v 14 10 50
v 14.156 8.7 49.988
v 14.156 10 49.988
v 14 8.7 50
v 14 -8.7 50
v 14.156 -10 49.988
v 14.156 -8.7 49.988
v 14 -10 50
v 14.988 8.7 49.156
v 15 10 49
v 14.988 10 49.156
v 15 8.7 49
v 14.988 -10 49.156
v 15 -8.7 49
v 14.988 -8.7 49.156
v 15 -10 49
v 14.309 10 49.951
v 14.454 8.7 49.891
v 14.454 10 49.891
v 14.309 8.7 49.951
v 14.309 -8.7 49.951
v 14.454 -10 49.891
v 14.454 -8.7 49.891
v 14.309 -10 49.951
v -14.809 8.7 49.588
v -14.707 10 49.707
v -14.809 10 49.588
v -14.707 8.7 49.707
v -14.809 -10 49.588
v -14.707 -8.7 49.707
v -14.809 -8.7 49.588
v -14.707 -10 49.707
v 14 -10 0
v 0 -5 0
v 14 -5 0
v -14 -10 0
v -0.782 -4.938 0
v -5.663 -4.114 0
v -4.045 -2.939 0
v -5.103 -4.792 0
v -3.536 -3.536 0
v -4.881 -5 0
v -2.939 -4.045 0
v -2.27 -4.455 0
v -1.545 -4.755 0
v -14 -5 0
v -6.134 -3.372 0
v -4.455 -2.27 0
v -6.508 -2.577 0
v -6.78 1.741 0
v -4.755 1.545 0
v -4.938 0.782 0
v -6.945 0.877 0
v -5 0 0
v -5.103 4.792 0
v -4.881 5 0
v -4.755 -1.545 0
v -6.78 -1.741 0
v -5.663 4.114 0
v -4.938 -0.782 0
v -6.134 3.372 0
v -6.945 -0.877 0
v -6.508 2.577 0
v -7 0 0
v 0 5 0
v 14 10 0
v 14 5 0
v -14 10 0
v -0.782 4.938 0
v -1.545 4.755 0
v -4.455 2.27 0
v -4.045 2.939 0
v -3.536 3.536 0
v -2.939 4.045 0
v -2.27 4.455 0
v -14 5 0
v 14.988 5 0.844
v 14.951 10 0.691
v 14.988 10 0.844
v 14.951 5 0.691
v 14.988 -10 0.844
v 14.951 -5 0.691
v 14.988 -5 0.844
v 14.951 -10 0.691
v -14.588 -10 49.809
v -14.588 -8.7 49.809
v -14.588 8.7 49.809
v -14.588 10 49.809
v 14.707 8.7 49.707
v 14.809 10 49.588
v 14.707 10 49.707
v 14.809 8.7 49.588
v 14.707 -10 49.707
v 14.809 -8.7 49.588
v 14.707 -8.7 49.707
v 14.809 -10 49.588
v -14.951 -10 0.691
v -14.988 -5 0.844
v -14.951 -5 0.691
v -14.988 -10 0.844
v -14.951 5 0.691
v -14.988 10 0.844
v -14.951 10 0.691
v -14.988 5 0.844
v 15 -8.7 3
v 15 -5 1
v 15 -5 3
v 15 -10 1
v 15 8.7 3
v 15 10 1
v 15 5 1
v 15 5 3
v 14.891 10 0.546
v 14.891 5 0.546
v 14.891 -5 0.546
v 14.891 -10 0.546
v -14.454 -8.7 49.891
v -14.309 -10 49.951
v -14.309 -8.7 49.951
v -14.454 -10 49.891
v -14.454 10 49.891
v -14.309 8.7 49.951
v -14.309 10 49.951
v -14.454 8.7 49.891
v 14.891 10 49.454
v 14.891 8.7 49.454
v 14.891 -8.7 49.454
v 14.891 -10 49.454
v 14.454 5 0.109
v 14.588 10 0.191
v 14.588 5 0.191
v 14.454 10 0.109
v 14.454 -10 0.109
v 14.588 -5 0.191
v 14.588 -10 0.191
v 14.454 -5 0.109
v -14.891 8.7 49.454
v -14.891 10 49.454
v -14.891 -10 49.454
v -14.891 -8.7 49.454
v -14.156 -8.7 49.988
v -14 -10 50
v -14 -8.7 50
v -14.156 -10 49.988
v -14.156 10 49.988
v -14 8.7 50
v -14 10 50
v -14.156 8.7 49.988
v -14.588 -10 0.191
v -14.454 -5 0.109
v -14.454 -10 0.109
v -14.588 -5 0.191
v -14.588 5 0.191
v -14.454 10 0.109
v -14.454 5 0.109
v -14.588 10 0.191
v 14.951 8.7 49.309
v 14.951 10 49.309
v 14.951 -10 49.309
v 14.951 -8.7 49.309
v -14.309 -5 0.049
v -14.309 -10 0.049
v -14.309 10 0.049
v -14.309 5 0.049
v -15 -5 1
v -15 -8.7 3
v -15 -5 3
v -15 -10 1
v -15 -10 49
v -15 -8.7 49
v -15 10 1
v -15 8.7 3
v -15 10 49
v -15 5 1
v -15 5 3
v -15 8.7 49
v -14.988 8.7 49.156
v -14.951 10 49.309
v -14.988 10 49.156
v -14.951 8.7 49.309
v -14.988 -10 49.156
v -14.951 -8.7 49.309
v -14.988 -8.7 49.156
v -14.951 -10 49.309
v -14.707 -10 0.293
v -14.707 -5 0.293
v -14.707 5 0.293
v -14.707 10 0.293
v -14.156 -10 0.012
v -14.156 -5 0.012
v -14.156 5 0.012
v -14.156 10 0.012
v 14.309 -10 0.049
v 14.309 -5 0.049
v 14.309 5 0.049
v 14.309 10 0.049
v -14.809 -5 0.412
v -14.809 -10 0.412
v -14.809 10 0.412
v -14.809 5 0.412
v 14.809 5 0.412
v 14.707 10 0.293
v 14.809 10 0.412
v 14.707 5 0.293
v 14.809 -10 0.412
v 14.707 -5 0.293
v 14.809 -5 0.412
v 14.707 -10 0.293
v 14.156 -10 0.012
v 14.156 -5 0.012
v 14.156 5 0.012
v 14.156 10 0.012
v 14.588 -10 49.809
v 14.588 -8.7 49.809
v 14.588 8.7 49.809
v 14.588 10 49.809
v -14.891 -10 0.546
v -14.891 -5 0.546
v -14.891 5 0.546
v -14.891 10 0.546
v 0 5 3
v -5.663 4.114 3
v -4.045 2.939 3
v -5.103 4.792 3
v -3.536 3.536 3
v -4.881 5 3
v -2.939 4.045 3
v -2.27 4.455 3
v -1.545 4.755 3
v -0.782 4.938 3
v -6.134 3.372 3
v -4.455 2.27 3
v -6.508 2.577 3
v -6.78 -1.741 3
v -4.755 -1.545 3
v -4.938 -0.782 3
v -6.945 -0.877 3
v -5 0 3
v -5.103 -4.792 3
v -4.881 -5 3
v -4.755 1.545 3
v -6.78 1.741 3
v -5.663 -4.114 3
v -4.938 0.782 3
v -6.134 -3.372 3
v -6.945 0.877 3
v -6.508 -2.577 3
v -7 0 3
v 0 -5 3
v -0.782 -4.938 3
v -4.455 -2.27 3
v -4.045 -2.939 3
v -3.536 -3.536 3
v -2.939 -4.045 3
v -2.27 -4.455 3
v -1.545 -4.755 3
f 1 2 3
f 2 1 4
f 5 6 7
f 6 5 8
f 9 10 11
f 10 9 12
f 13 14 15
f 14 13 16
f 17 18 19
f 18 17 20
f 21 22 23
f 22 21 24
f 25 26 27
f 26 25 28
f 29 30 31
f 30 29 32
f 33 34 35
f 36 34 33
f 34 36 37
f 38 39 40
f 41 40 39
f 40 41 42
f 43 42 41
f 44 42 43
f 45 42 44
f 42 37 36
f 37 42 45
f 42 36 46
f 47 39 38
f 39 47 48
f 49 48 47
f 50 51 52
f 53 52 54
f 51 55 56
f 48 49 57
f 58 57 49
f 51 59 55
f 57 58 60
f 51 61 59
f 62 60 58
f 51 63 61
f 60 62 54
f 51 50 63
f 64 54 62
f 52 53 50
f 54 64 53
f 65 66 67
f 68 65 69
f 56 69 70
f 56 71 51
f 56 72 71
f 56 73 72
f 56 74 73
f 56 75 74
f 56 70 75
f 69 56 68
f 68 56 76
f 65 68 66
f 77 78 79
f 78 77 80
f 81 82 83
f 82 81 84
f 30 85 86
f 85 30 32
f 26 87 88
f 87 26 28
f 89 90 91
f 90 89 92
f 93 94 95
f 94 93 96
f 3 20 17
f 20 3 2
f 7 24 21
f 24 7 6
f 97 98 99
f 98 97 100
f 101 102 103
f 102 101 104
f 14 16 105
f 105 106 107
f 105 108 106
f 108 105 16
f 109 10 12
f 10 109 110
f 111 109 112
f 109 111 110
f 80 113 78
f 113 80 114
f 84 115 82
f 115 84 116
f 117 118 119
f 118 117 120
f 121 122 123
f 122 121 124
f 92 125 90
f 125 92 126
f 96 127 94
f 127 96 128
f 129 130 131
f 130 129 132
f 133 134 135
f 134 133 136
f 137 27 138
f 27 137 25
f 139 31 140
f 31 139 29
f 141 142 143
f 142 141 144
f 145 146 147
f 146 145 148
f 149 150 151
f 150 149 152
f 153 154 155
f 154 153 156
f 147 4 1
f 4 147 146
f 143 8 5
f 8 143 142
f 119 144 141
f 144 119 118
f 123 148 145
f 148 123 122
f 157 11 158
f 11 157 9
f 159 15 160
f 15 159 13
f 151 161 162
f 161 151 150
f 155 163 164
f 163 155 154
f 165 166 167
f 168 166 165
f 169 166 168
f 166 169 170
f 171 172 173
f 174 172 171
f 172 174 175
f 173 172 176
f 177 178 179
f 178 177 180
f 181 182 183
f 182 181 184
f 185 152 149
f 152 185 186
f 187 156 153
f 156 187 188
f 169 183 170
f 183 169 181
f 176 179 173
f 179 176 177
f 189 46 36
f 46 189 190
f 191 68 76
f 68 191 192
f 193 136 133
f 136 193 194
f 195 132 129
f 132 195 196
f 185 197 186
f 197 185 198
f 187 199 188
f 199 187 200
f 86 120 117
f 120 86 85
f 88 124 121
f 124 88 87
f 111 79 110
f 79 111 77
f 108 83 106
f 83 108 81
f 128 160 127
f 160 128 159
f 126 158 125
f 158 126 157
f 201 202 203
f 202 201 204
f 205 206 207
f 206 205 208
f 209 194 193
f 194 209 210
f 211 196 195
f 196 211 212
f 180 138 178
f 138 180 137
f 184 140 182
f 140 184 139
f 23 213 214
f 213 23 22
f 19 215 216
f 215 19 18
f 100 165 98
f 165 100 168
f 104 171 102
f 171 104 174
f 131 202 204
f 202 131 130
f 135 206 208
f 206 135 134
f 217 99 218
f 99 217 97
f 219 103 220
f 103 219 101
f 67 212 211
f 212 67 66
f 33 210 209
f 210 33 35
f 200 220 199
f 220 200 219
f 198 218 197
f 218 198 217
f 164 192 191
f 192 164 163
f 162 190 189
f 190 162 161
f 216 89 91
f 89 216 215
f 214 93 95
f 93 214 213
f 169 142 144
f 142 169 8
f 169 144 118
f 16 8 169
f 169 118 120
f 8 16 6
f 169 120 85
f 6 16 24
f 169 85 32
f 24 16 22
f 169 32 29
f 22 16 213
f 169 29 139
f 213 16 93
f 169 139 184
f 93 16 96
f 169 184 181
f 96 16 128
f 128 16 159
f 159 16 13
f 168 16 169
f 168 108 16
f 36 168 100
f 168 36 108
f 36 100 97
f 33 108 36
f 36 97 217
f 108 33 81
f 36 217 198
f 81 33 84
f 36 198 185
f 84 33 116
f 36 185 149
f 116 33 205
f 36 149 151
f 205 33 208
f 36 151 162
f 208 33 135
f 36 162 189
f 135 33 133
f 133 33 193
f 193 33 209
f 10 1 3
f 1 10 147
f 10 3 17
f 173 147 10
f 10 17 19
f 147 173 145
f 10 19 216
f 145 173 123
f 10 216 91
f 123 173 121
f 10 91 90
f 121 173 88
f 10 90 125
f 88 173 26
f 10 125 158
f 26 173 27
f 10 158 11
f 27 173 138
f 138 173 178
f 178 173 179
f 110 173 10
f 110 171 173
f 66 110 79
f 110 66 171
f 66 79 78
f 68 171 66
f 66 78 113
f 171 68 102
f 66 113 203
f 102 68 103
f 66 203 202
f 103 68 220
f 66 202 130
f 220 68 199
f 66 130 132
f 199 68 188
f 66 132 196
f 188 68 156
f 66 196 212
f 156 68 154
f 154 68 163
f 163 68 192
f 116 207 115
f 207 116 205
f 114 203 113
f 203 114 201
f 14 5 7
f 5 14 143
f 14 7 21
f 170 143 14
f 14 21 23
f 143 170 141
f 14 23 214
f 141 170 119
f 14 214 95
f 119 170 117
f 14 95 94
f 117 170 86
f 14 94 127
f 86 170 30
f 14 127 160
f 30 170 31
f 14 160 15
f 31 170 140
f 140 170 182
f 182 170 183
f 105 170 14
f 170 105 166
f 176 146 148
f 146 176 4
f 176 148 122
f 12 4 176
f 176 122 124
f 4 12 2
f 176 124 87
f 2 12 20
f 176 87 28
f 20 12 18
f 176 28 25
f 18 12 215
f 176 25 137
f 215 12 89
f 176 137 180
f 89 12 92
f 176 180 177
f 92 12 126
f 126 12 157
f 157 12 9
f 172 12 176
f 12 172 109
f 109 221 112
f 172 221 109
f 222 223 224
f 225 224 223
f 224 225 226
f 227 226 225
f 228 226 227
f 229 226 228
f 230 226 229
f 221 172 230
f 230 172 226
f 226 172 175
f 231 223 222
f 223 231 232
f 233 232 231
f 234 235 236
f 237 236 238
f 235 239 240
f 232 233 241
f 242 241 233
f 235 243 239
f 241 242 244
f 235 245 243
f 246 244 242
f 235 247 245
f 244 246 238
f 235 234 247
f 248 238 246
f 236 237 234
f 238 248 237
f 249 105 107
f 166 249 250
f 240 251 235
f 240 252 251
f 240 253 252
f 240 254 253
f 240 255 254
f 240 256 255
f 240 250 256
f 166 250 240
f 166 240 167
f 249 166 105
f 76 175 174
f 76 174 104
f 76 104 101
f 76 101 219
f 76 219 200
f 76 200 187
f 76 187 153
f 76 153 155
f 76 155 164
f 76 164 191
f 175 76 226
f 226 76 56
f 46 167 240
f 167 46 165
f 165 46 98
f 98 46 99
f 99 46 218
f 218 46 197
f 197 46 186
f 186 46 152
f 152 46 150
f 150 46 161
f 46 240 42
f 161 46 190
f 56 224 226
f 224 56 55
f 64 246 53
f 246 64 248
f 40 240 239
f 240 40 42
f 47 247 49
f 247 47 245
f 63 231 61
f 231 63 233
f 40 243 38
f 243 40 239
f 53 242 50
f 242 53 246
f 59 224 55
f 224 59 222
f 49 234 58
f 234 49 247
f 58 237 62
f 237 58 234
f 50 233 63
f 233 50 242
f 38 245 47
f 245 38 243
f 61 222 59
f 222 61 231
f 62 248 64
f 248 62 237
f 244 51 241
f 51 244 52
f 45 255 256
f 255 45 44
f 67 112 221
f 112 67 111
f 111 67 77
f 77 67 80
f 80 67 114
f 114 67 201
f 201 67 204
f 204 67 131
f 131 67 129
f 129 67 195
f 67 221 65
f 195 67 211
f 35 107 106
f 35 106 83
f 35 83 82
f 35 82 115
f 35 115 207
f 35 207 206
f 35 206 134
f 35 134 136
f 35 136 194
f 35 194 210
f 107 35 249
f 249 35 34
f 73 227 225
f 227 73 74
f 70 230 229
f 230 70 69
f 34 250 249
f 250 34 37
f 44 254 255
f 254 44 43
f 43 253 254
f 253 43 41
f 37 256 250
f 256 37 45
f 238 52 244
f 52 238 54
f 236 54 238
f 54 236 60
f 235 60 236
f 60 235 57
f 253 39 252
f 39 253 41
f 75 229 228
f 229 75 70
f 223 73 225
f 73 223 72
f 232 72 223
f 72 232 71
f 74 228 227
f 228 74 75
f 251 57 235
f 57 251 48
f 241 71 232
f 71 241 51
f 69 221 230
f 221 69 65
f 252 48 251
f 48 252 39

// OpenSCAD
R1 = 1;
sx = 30;
sy = 55-35+30;
x = sx-R1*2;
y = sy-R1*2;
h = 20; //16.5
h_cut = 16.5+1-0.1;

module part() {
difference() {
    translate([0, 0, sy/2]) {
        rotate([90, 0, 0]) {  
            difference () {
                hull() {    
                    translate([+x/2, +y/2, 0])
                      cylinder(h=h, r1=R1, r2=R1, center=true, $fn=40);
                    translate([+x/2, -y/2, 0])
                      cylinder(h=h, r1=R1, r2=R1, center=true, $fn=40);  
                    translate([-x/2, +y/2, 0])
                      cylinder(h=h, r1=R1, r2=R1, center=true, $fn=40);
                    translate([-x/2, -y/2, 0])
                      cylinder(h=h, r1=R1, r2=R1, center=true, $fn=40);  
                }
                 
                translate([0, 3, 0])
                  cube([40, sy, h_cut], center=true) ;
            }
        }
    }
    
    union() {
        hull() {
            cylinder(h=40, r1=5, r2=5, $fn=40, center=true);
        translate([20, 0, 0])
            cylinder(h=40, r1=5, r2=5, $fn=40, center=true);
        }
        
        
       translate([-30, 0, 0])
        difference() {
            cube([60, 10, 10], center=true);
            translate([30, 0, 0])
              cylinder(h=40, r1=7, r2=7, $fn=50, center=true);
        }
        
    }
}
}

part();
